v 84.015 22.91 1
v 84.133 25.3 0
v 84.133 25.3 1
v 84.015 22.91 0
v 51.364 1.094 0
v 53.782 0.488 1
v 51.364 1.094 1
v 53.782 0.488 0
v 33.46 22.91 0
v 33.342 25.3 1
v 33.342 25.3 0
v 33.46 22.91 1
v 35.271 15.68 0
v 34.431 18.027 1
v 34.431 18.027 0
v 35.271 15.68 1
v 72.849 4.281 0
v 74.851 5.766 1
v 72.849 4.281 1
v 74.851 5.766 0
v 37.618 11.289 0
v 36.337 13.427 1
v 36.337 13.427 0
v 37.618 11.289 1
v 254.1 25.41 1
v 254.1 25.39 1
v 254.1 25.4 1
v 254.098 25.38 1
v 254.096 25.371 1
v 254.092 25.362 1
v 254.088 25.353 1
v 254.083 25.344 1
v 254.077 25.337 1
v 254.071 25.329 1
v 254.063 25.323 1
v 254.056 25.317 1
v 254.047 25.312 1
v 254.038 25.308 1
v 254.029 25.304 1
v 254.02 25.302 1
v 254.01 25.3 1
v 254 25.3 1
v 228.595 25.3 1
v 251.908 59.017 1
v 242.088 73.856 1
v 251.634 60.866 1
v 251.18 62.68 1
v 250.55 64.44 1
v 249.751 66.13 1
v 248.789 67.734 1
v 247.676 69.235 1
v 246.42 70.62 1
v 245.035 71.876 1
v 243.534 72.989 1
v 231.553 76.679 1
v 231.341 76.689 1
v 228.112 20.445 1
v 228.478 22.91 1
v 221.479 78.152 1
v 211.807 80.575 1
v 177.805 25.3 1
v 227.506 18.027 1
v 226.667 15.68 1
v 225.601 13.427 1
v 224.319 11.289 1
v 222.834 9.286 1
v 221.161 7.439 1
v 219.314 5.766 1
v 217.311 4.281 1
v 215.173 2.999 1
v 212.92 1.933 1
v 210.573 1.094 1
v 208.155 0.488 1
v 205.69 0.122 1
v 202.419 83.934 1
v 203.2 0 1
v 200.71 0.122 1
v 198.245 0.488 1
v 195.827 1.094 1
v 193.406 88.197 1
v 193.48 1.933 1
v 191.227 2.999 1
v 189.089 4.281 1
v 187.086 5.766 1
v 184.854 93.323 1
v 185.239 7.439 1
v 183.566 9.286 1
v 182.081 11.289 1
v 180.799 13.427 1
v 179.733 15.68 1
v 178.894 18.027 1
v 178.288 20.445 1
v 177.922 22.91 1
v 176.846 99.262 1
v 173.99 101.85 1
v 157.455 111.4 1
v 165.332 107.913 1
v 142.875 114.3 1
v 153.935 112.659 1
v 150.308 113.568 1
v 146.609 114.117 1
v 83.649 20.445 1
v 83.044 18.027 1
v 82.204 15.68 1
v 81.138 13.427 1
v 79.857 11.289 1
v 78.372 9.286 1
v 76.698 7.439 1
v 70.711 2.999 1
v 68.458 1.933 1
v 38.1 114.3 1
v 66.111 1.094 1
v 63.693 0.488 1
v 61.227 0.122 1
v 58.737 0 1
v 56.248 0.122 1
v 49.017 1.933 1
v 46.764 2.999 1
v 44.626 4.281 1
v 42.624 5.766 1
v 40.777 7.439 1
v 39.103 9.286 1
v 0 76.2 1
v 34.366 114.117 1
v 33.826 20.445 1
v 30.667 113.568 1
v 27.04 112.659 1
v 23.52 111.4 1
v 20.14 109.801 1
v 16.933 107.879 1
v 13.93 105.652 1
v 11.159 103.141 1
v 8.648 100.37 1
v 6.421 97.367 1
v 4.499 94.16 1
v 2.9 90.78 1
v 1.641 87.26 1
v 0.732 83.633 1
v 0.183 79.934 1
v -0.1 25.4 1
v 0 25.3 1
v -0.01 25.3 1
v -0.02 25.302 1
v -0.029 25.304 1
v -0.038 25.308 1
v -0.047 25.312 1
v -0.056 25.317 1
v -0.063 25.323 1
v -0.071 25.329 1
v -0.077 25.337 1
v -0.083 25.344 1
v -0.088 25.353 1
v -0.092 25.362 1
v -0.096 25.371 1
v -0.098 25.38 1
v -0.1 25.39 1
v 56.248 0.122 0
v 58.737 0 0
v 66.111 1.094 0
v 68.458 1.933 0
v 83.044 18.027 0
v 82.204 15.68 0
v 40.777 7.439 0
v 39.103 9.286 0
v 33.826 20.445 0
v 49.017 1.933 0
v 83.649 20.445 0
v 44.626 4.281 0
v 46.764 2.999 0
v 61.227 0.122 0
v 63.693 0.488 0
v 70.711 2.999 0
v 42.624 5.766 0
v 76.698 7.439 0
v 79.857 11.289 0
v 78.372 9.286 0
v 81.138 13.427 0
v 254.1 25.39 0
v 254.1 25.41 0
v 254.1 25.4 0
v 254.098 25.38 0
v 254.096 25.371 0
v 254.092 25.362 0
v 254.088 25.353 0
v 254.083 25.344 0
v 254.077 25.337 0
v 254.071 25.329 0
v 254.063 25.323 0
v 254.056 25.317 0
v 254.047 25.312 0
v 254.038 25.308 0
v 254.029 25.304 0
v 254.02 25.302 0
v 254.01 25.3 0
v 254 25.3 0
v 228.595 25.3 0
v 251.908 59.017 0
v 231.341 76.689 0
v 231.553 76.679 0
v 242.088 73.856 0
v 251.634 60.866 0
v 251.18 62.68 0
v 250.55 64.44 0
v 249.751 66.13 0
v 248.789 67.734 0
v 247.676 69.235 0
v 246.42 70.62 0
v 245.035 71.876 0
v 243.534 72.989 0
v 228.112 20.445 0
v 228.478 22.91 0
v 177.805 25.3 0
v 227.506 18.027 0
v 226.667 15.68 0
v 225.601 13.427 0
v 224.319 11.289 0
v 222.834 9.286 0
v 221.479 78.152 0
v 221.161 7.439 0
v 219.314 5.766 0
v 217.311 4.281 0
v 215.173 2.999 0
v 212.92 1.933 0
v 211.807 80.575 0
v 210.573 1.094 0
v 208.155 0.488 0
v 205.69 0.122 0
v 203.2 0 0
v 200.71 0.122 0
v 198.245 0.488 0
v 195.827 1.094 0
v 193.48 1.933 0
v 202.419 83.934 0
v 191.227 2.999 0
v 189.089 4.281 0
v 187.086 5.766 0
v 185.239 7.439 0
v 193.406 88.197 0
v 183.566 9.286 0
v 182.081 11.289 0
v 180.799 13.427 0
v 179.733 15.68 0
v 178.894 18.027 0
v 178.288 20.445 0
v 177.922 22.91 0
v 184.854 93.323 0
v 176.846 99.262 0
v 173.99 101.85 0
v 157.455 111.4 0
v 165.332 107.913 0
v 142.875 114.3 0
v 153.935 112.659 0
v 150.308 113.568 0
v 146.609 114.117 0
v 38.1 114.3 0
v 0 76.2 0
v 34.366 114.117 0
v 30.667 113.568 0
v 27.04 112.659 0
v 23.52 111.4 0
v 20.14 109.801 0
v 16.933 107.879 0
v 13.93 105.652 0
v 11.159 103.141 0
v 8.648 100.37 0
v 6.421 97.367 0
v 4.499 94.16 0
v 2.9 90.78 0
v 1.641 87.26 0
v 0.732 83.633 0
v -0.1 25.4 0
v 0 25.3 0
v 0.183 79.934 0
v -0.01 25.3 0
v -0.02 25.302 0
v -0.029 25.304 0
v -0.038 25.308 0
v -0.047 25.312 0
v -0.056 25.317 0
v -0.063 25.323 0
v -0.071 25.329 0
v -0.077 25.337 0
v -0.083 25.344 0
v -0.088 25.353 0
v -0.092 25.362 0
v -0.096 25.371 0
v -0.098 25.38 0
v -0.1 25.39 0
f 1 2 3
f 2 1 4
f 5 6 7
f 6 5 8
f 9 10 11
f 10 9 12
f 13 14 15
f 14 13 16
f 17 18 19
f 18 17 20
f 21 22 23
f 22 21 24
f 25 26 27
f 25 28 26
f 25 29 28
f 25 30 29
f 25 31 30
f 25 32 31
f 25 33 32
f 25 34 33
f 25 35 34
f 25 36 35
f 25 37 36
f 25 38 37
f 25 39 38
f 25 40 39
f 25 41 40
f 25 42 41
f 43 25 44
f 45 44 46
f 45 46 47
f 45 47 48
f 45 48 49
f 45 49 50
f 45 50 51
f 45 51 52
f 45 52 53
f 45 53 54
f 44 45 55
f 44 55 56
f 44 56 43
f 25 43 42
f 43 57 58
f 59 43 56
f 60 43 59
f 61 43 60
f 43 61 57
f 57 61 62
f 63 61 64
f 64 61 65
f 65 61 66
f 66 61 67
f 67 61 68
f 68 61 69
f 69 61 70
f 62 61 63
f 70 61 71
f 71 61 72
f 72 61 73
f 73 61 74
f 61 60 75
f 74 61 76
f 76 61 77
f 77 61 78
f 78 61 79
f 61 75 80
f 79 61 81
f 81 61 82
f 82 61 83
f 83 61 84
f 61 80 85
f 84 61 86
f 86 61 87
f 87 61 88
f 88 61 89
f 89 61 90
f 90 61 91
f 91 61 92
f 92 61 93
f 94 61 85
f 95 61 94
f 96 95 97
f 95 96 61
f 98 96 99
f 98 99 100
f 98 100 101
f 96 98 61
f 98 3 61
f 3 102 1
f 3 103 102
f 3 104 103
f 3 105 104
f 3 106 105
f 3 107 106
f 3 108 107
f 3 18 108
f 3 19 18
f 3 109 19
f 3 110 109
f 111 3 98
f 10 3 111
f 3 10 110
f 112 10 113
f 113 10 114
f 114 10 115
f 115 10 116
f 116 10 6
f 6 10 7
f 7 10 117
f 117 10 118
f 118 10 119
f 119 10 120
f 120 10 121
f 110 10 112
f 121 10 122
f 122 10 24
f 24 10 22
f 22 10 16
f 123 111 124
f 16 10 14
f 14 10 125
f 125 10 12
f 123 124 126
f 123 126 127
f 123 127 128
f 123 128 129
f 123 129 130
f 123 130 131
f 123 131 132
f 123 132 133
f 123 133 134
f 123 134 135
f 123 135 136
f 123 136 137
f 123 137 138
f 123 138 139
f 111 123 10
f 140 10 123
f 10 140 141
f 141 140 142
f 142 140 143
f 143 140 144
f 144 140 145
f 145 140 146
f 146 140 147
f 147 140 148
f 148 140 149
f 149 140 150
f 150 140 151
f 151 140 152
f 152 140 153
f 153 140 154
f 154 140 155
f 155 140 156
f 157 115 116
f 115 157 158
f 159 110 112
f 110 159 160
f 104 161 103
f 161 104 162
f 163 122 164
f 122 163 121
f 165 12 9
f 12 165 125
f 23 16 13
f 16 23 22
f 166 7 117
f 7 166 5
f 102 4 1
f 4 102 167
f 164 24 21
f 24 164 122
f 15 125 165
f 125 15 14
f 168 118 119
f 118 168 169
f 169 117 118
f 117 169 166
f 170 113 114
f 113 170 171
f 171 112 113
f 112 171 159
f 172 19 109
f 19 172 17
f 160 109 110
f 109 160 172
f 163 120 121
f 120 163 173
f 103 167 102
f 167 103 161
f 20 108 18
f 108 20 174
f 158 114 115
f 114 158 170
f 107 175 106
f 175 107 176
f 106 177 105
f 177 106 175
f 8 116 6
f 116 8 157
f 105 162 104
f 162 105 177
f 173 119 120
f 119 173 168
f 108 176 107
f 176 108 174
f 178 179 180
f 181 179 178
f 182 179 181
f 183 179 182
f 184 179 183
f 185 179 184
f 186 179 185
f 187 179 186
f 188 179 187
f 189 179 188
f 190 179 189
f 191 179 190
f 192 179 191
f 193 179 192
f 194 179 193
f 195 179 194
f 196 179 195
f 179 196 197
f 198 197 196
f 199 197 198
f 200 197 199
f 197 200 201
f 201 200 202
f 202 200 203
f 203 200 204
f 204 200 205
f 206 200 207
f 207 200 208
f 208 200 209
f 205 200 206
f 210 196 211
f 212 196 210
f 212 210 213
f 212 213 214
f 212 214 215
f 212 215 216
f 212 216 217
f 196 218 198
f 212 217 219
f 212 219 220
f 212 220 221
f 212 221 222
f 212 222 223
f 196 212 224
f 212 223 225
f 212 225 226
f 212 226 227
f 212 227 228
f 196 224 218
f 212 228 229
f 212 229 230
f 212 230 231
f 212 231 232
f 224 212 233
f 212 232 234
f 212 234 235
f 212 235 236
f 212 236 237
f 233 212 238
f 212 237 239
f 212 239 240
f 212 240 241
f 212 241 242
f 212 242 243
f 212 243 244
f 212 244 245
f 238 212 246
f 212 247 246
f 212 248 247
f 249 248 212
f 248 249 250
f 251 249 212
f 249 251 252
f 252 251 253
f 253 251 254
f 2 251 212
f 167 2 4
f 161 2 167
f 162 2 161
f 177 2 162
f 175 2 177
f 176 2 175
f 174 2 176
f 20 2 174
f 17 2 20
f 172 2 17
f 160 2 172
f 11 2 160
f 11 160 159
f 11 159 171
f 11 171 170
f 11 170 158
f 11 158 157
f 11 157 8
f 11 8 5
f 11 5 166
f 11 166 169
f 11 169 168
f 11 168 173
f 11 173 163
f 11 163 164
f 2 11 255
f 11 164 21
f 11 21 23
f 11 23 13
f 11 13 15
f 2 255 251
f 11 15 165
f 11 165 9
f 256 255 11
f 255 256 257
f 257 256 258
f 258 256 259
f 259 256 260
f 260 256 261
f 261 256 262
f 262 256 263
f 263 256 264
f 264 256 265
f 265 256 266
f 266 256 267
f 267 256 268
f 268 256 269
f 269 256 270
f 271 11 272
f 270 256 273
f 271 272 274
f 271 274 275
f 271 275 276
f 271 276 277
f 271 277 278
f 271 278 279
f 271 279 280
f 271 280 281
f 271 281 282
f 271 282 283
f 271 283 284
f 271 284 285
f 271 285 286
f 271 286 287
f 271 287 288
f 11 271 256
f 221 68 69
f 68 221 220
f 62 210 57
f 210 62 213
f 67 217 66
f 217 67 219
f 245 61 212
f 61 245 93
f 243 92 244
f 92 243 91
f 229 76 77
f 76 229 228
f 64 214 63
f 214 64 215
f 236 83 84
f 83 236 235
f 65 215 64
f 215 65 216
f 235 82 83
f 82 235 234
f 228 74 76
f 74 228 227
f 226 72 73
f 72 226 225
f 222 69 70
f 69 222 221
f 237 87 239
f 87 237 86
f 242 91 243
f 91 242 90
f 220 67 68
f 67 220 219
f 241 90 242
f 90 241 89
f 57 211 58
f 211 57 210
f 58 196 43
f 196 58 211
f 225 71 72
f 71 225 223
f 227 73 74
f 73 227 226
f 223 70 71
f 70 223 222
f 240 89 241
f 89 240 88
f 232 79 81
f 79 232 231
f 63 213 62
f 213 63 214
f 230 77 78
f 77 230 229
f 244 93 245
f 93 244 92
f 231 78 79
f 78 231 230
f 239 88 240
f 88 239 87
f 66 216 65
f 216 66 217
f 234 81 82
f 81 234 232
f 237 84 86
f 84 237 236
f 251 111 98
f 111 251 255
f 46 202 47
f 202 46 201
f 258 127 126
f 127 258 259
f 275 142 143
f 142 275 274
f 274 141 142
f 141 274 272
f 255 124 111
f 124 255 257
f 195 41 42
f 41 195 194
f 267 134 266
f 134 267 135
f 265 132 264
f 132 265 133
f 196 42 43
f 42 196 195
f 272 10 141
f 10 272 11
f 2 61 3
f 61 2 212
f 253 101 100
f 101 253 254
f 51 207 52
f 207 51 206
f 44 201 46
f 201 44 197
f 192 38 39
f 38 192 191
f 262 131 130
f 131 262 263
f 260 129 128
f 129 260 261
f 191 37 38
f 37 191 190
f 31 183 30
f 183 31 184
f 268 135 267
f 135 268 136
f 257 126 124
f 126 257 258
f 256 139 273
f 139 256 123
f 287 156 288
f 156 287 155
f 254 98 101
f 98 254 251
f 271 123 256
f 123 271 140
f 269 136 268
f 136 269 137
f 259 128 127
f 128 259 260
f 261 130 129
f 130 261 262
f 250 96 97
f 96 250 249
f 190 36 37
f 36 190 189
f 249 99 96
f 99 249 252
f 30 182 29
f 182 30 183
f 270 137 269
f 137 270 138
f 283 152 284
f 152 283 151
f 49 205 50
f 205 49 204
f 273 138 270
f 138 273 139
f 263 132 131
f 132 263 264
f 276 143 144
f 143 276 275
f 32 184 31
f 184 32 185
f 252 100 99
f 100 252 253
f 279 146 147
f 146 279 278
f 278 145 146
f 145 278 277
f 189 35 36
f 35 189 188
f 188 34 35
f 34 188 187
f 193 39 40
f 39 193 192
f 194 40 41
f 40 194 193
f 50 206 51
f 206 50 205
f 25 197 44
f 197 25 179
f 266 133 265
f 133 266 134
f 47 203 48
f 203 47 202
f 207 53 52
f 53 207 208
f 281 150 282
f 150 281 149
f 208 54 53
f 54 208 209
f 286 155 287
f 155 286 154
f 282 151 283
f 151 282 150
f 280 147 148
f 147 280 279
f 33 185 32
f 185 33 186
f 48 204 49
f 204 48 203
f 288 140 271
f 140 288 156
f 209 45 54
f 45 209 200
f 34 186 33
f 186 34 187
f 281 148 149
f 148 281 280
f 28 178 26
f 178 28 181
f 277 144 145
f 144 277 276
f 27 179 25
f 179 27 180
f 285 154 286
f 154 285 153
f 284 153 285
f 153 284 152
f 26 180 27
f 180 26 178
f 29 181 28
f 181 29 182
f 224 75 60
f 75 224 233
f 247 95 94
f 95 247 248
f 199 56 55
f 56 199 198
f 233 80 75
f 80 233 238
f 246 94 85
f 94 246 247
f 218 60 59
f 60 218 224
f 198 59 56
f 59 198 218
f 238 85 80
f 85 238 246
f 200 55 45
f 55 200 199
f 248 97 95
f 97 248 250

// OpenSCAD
// test

$fn=64;

function inch(length) = 25.4 * length;

$wheel_r = inch(1);
$hood_r = inch(.75);
$hood_y = inch(2.25);

$roof_x = inch(5.625);
$roof_y = inch(3);
$roof_r = inch(1.5);

$rear_roof_r = inch(1.5);
$rear_roof_x = inch(1.5);
$rear_roof_y = inch(3);

$wheel_rear_x = inch(2.3125);
$wheel_front_x = inch(8);

$front_bump_x = inch(10);


module positive_body() {
    union() {
        translate([$wheel_rear_x,$wheel_r,0]) {
            cylinder(r=$wheel_r, h=1);
        }
        
        translate([$wheel_front_x,$wheel_r,0]) {
            cylinder(r=$wheel_r, h=1);
        }
        
        hull() {
            translate([0,$wheel_r,0]) {
                cylinder(r=0.1, h=1);
            }
            translate([$front_bump_x,$wheel_r,0]) {
                cylinder(r=0.1, h=1);
            }
            translate([$front_bump_x - $hood_r - 2,$hood_y,0]) {
                cylinder(r=$hood_r, h=1);
            }
        
            
            translate([$roof_x, $roof_y,0]) {
                cylinder(r=$roof_r, h=1);
            }
            translate([$rear_roof_x,$rear_roof_y,0]) {
                cylinder(r=$rear_roof_r, h=1);
            }  

        
        }
    }
}

module final_body() {
    difference() {
        positive_body();
        translate([inch(9.5),inch(7),0]) {
            cylinder(r=inch(4), h=5);
        }
        translate([inch(9),inch(3.05),0]) {
            rotate([0,0,-15]) {
                cube([inch(1),inch(1),5]);
            }
        }
        translate([inch(6.15),inch(4.5),0]) {
            rotate([0,0,-35]) {
                cube([inch(1),inch(1),5]);
            }
        }            
    }
}

final_body();
